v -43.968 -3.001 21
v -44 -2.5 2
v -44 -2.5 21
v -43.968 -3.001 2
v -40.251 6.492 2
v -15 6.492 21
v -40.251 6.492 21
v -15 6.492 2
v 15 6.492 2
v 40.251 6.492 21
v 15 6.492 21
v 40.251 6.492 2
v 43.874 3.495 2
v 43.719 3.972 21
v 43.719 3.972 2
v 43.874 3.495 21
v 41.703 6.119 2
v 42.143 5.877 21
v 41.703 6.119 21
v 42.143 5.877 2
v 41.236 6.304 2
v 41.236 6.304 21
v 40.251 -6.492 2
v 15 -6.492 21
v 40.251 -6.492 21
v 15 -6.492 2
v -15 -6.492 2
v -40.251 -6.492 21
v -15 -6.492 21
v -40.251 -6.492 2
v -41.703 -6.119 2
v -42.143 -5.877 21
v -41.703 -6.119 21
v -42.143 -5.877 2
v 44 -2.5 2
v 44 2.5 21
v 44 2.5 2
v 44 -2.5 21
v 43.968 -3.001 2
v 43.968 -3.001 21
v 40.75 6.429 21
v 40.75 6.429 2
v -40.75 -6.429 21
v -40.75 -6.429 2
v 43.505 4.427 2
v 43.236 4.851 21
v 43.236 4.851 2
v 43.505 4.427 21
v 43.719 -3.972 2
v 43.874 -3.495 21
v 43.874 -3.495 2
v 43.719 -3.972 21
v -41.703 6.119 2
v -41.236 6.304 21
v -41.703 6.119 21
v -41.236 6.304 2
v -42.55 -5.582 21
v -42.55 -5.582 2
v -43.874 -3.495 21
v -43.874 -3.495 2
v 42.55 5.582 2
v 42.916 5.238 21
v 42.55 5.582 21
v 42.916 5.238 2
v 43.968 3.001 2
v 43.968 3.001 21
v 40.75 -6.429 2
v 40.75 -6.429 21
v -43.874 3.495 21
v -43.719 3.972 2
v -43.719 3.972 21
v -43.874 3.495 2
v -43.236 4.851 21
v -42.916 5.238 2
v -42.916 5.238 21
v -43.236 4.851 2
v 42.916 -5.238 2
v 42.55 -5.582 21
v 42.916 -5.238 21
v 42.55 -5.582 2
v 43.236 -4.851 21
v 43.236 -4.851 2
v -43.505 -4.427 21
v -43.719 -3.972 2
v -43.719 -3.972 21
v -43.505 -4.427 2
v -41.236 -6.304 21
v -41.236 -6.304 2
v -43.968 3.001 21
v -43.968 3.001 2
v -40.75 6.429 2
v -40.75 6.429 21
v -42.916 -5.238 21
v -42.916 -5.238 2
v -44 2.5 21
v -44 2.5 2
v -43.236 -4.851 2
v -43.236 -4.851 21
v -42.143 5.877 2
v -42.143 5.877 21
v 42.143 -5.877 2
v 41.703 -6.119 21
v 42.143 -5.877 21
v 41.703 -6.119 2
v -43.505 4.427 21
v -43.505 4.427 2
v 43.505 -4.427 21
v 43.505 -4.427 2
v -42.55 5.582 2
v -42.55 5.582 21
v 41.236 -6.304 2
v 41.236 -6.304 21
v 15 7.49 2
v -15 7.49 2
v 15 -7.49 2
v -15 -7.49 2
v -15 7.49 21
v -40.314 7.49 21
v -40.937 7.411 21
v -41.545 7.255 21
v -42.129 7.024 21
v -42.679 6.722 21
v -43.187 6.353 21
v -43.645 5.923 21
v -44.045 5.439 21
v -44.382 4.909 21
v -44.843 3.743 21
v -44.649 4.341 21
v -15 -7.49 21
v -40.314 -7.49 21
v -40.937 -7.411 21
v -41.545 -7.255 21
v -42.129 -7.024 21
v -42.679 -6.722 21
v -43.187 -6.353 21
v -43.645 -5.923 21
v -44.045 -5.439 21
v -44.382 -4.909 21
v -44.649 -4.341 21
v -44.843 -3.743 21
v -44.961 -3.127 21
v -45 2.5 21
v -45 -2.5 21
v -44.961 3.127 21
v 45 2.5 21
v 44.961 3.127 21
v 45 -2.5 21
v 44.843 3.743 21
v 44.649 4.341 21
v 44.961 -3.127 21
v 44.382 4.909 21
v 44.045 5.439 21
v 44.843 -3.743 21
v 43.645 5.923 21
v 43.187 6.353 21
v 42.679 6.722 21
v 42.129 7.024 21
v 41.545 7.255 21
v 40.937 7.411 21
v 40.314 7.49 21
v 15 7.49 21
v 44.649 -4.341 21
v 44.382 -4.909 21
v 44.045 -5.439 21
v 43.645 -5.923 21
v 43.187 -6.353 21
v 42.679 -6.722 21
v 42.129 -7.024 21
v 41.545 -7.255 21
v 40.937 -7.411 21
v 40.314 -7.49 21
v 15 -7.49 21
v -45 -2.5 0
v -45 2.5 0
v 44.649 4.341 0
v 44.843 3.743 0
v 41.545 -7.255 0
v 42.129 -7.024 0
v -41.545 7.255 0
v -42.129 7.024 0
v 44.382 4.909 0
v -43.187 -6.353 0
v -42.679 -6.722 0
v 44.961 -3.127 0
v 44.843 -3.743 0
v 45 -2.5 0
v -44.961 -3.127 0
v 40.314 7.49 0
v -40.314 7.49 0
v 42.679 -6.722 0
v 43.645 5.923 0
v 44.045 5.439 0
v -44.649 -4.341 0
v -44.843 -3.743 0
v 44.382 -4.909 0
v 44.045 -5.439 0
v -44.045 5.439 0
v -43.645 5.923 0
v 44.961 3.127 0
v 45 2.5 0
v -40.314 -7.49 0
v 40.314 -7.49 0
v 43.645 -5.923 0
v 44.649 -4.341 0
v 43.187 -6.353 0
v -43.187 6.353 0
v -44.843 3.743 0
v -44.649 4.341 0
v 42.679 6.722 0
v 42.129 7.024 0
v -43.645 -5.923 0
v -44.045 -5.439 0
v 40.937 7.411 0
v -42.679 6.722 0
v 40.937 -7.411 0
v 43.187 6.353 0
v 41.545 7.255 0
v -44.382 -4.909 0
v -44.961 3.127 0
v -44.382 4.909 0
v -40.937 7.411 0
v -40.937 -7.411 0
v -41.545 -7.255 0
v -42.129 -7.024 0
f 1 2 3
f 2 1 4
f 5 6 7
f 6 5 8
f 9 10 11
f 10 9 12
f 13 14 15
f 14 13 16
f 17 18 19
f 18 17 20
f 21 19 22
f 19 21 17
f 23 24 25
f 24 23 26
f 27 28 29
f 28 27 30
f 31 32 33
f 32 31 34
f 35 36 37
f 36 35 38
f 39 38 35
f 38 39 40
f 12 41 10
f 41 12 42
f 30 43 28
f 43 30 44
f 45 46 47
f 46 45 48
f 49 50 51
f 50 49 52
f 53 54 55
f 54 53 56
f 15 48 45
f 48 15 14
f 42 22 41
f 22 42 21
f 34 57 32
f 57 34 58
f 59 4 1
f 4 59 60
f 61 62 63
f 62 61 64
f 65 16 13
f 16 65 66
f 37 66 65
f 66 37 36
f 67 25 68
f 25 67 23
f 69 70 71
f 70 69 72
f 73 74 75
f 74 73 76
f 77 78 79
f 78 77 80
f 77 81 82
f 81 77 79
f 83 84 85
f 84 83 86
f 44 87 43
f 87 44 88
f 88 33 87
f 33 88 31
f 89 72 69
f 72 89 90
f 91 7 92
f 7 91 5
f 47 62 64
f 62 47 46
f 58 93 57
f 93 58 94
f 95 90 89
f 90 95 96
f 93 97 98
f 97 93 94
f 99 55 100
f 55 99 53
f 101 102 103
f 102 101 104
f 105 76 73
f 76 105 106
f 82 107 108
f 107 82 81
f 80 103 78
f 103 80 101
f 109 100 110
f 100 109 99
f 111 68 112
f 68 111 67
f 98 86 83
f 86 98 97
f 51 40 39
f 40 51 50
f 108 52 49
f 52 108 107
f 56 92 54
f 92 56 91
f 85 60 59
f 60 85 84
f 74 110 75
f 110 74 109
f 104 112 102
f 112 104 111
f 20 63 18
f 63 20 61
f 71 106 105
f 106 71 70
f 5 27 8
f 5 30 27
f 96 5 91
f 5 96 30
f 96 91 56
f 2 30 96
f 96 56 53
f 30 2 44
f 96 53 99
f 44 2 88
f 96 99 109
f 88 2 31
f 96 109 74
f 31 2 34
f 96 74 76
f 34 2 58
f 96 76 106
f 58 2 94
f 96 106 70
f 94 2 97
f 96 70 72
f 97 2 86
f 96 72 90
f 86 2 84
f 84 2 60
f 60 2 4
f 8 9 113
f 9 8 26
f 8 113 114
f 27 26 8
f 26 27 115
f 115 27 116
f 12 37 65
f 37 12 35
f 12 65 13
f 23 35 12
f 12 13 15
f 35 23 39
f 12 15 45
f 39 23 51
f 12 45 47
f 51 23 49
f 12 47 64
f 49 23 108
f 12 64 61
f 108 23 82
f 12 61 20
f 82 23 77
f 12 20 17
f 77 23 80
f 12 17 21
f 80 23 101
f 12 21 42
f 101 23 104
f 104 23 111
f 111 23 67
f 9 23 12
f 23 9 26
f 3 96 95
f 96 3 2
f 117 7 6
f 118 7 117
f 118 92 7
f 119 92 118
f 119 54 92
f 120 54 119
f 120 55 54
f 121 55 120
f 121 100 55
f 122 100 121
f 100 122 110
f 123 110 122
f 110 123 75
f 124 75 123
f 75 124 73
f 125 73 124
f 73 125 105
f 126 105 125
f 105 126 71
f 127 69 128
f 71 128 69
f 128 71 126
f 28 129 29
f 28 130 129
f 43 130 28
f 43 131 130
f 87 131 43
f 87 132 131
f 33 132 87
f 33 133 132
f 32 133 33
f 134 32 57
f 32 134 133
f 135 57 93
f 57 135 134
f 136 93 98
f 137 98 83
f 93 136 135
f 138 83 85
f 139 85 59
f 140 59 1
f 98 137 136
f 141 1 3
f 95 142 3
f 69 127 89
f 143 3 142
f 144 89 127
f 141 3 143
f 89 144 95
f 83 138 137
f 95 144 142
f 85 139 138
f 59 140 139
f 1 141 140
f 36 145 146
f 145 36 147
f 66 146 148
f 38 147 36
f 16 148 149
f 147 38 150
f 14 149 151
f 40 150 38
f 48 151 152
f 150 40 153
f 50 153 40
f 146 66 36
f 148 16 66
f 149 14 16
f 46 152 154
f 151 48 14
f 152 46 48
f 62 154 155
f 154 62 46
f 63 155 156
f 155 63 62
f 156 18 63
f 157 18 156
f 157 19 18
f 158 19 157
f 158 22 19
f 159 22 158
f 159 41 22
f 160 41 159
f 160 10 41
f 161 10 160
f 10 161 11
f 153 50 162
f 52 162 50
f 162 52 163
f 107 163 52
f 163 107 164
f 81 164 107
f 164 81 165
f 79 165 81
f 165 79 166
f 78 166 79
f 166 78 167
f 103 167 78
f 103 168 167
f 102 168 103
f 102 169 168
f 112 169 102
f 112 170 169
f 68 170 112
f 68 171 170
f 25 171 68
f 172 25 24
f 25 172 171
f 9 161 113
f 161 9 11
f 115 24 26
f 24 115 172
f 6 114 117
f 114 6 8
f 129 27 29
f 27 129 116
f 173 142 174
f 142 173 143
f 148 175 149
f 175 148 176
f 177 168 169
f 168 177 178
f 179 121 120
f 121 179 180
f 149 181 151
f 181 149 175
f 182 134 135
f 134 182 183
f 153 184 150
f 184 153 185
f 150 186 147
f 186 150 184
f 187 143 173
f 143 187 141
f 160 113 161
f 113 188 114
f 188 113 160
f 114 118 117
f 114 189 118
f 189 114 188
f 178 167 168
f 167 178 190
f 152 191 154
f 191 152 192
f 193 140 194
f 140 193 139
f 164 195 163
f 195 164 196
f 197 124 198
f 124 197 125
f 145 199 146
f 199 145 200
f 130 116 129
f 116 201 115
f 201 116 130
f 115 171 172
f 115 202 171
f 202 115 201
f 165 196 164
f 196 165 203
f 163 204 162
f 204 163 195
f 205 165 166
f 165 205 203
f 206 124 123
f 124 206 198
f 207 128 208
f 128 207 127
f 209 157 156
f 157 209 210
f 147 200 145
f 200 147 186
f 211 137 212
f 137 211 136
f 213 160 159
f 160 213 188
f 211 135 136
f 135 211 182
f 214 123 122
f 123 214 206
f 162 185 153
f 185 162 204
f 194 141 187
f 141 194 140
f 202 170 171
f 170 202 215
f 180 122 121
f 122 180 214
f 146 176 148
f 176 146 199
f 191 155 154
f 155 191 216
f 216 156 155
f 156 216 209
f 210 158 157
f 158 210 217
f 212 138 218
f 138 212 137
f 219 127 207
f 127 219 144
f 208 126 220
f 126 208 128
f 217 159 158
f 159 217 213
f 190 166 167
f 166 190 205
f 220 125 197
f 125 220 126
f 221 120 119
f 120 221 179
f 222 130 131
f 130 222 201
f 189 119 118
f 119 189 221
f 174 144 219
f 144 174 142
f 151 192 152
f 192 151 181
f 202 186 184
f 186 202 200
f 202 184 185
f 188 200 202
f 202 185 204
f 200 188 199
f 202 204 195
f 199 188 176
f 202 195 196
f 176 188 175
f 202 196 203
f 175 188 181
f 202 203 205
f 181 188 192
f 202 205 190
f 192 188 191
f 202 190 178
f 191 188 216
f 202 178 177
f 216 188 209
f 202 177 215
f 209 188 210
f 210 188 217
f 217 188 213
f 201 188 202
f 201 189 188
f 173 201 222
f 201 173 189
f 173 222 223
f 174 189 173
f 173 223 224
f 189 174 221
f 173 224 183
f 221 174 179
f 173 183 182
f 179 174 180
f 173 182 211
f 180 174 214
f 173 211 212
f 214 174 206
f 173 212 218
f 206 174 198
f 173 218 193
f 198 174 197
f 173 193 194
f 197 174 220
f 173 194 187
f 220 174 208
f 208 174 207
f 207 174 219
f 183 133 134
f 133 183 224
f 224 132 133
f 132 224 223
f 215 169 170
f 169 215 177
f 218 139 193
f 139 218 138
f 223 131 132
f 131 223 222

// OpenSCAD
$fn = 50;


difference() {
	union() {
		hull() {
			translate(v = [-40.0000000000, 2.5000000000, 0]) {
				cylinder(h = 21, r = 5);
			}
			translate(v = [40.0000000000, 2.5000000000, 0]) {
				cylinder(h = 21, r = 5);
			}
			translate(v = [-40.0000000000, -2.5000000000, 0]) {
				cylinder(h = 21, r = 5);
			}
			translate(v = [40.0000000000, -2.5000000000, 0]) {
				cylinder(h = 21, r = 5);
			}
		}
	}
	union() {
		translate(v = [0, 0, 2]) {
			hull() {
				translate(v = [-40.0000000000, 2.5000000000, 0]) {
					cylinder(h = 19, r = 4);
				}
				translate(v = [40.0000000000, 2.5000000000, 0]) {
					cylinder(h = 19, r = 4);
				}
				translate(v = [-40.0000000000, -2.5000000000, 0]) {
					cylinder(h = 19, r = 4);
				}
				translate(v = [40.0000000000, -2.5000000000, 0]) {
					cylinder(h = 19, r = 4);
				}
			}
		}
		#translate(v = [-15.0000000000, -15.0000000000, 2]) {
			cube(size = [30, 30, 19]);
		}
	}
}
